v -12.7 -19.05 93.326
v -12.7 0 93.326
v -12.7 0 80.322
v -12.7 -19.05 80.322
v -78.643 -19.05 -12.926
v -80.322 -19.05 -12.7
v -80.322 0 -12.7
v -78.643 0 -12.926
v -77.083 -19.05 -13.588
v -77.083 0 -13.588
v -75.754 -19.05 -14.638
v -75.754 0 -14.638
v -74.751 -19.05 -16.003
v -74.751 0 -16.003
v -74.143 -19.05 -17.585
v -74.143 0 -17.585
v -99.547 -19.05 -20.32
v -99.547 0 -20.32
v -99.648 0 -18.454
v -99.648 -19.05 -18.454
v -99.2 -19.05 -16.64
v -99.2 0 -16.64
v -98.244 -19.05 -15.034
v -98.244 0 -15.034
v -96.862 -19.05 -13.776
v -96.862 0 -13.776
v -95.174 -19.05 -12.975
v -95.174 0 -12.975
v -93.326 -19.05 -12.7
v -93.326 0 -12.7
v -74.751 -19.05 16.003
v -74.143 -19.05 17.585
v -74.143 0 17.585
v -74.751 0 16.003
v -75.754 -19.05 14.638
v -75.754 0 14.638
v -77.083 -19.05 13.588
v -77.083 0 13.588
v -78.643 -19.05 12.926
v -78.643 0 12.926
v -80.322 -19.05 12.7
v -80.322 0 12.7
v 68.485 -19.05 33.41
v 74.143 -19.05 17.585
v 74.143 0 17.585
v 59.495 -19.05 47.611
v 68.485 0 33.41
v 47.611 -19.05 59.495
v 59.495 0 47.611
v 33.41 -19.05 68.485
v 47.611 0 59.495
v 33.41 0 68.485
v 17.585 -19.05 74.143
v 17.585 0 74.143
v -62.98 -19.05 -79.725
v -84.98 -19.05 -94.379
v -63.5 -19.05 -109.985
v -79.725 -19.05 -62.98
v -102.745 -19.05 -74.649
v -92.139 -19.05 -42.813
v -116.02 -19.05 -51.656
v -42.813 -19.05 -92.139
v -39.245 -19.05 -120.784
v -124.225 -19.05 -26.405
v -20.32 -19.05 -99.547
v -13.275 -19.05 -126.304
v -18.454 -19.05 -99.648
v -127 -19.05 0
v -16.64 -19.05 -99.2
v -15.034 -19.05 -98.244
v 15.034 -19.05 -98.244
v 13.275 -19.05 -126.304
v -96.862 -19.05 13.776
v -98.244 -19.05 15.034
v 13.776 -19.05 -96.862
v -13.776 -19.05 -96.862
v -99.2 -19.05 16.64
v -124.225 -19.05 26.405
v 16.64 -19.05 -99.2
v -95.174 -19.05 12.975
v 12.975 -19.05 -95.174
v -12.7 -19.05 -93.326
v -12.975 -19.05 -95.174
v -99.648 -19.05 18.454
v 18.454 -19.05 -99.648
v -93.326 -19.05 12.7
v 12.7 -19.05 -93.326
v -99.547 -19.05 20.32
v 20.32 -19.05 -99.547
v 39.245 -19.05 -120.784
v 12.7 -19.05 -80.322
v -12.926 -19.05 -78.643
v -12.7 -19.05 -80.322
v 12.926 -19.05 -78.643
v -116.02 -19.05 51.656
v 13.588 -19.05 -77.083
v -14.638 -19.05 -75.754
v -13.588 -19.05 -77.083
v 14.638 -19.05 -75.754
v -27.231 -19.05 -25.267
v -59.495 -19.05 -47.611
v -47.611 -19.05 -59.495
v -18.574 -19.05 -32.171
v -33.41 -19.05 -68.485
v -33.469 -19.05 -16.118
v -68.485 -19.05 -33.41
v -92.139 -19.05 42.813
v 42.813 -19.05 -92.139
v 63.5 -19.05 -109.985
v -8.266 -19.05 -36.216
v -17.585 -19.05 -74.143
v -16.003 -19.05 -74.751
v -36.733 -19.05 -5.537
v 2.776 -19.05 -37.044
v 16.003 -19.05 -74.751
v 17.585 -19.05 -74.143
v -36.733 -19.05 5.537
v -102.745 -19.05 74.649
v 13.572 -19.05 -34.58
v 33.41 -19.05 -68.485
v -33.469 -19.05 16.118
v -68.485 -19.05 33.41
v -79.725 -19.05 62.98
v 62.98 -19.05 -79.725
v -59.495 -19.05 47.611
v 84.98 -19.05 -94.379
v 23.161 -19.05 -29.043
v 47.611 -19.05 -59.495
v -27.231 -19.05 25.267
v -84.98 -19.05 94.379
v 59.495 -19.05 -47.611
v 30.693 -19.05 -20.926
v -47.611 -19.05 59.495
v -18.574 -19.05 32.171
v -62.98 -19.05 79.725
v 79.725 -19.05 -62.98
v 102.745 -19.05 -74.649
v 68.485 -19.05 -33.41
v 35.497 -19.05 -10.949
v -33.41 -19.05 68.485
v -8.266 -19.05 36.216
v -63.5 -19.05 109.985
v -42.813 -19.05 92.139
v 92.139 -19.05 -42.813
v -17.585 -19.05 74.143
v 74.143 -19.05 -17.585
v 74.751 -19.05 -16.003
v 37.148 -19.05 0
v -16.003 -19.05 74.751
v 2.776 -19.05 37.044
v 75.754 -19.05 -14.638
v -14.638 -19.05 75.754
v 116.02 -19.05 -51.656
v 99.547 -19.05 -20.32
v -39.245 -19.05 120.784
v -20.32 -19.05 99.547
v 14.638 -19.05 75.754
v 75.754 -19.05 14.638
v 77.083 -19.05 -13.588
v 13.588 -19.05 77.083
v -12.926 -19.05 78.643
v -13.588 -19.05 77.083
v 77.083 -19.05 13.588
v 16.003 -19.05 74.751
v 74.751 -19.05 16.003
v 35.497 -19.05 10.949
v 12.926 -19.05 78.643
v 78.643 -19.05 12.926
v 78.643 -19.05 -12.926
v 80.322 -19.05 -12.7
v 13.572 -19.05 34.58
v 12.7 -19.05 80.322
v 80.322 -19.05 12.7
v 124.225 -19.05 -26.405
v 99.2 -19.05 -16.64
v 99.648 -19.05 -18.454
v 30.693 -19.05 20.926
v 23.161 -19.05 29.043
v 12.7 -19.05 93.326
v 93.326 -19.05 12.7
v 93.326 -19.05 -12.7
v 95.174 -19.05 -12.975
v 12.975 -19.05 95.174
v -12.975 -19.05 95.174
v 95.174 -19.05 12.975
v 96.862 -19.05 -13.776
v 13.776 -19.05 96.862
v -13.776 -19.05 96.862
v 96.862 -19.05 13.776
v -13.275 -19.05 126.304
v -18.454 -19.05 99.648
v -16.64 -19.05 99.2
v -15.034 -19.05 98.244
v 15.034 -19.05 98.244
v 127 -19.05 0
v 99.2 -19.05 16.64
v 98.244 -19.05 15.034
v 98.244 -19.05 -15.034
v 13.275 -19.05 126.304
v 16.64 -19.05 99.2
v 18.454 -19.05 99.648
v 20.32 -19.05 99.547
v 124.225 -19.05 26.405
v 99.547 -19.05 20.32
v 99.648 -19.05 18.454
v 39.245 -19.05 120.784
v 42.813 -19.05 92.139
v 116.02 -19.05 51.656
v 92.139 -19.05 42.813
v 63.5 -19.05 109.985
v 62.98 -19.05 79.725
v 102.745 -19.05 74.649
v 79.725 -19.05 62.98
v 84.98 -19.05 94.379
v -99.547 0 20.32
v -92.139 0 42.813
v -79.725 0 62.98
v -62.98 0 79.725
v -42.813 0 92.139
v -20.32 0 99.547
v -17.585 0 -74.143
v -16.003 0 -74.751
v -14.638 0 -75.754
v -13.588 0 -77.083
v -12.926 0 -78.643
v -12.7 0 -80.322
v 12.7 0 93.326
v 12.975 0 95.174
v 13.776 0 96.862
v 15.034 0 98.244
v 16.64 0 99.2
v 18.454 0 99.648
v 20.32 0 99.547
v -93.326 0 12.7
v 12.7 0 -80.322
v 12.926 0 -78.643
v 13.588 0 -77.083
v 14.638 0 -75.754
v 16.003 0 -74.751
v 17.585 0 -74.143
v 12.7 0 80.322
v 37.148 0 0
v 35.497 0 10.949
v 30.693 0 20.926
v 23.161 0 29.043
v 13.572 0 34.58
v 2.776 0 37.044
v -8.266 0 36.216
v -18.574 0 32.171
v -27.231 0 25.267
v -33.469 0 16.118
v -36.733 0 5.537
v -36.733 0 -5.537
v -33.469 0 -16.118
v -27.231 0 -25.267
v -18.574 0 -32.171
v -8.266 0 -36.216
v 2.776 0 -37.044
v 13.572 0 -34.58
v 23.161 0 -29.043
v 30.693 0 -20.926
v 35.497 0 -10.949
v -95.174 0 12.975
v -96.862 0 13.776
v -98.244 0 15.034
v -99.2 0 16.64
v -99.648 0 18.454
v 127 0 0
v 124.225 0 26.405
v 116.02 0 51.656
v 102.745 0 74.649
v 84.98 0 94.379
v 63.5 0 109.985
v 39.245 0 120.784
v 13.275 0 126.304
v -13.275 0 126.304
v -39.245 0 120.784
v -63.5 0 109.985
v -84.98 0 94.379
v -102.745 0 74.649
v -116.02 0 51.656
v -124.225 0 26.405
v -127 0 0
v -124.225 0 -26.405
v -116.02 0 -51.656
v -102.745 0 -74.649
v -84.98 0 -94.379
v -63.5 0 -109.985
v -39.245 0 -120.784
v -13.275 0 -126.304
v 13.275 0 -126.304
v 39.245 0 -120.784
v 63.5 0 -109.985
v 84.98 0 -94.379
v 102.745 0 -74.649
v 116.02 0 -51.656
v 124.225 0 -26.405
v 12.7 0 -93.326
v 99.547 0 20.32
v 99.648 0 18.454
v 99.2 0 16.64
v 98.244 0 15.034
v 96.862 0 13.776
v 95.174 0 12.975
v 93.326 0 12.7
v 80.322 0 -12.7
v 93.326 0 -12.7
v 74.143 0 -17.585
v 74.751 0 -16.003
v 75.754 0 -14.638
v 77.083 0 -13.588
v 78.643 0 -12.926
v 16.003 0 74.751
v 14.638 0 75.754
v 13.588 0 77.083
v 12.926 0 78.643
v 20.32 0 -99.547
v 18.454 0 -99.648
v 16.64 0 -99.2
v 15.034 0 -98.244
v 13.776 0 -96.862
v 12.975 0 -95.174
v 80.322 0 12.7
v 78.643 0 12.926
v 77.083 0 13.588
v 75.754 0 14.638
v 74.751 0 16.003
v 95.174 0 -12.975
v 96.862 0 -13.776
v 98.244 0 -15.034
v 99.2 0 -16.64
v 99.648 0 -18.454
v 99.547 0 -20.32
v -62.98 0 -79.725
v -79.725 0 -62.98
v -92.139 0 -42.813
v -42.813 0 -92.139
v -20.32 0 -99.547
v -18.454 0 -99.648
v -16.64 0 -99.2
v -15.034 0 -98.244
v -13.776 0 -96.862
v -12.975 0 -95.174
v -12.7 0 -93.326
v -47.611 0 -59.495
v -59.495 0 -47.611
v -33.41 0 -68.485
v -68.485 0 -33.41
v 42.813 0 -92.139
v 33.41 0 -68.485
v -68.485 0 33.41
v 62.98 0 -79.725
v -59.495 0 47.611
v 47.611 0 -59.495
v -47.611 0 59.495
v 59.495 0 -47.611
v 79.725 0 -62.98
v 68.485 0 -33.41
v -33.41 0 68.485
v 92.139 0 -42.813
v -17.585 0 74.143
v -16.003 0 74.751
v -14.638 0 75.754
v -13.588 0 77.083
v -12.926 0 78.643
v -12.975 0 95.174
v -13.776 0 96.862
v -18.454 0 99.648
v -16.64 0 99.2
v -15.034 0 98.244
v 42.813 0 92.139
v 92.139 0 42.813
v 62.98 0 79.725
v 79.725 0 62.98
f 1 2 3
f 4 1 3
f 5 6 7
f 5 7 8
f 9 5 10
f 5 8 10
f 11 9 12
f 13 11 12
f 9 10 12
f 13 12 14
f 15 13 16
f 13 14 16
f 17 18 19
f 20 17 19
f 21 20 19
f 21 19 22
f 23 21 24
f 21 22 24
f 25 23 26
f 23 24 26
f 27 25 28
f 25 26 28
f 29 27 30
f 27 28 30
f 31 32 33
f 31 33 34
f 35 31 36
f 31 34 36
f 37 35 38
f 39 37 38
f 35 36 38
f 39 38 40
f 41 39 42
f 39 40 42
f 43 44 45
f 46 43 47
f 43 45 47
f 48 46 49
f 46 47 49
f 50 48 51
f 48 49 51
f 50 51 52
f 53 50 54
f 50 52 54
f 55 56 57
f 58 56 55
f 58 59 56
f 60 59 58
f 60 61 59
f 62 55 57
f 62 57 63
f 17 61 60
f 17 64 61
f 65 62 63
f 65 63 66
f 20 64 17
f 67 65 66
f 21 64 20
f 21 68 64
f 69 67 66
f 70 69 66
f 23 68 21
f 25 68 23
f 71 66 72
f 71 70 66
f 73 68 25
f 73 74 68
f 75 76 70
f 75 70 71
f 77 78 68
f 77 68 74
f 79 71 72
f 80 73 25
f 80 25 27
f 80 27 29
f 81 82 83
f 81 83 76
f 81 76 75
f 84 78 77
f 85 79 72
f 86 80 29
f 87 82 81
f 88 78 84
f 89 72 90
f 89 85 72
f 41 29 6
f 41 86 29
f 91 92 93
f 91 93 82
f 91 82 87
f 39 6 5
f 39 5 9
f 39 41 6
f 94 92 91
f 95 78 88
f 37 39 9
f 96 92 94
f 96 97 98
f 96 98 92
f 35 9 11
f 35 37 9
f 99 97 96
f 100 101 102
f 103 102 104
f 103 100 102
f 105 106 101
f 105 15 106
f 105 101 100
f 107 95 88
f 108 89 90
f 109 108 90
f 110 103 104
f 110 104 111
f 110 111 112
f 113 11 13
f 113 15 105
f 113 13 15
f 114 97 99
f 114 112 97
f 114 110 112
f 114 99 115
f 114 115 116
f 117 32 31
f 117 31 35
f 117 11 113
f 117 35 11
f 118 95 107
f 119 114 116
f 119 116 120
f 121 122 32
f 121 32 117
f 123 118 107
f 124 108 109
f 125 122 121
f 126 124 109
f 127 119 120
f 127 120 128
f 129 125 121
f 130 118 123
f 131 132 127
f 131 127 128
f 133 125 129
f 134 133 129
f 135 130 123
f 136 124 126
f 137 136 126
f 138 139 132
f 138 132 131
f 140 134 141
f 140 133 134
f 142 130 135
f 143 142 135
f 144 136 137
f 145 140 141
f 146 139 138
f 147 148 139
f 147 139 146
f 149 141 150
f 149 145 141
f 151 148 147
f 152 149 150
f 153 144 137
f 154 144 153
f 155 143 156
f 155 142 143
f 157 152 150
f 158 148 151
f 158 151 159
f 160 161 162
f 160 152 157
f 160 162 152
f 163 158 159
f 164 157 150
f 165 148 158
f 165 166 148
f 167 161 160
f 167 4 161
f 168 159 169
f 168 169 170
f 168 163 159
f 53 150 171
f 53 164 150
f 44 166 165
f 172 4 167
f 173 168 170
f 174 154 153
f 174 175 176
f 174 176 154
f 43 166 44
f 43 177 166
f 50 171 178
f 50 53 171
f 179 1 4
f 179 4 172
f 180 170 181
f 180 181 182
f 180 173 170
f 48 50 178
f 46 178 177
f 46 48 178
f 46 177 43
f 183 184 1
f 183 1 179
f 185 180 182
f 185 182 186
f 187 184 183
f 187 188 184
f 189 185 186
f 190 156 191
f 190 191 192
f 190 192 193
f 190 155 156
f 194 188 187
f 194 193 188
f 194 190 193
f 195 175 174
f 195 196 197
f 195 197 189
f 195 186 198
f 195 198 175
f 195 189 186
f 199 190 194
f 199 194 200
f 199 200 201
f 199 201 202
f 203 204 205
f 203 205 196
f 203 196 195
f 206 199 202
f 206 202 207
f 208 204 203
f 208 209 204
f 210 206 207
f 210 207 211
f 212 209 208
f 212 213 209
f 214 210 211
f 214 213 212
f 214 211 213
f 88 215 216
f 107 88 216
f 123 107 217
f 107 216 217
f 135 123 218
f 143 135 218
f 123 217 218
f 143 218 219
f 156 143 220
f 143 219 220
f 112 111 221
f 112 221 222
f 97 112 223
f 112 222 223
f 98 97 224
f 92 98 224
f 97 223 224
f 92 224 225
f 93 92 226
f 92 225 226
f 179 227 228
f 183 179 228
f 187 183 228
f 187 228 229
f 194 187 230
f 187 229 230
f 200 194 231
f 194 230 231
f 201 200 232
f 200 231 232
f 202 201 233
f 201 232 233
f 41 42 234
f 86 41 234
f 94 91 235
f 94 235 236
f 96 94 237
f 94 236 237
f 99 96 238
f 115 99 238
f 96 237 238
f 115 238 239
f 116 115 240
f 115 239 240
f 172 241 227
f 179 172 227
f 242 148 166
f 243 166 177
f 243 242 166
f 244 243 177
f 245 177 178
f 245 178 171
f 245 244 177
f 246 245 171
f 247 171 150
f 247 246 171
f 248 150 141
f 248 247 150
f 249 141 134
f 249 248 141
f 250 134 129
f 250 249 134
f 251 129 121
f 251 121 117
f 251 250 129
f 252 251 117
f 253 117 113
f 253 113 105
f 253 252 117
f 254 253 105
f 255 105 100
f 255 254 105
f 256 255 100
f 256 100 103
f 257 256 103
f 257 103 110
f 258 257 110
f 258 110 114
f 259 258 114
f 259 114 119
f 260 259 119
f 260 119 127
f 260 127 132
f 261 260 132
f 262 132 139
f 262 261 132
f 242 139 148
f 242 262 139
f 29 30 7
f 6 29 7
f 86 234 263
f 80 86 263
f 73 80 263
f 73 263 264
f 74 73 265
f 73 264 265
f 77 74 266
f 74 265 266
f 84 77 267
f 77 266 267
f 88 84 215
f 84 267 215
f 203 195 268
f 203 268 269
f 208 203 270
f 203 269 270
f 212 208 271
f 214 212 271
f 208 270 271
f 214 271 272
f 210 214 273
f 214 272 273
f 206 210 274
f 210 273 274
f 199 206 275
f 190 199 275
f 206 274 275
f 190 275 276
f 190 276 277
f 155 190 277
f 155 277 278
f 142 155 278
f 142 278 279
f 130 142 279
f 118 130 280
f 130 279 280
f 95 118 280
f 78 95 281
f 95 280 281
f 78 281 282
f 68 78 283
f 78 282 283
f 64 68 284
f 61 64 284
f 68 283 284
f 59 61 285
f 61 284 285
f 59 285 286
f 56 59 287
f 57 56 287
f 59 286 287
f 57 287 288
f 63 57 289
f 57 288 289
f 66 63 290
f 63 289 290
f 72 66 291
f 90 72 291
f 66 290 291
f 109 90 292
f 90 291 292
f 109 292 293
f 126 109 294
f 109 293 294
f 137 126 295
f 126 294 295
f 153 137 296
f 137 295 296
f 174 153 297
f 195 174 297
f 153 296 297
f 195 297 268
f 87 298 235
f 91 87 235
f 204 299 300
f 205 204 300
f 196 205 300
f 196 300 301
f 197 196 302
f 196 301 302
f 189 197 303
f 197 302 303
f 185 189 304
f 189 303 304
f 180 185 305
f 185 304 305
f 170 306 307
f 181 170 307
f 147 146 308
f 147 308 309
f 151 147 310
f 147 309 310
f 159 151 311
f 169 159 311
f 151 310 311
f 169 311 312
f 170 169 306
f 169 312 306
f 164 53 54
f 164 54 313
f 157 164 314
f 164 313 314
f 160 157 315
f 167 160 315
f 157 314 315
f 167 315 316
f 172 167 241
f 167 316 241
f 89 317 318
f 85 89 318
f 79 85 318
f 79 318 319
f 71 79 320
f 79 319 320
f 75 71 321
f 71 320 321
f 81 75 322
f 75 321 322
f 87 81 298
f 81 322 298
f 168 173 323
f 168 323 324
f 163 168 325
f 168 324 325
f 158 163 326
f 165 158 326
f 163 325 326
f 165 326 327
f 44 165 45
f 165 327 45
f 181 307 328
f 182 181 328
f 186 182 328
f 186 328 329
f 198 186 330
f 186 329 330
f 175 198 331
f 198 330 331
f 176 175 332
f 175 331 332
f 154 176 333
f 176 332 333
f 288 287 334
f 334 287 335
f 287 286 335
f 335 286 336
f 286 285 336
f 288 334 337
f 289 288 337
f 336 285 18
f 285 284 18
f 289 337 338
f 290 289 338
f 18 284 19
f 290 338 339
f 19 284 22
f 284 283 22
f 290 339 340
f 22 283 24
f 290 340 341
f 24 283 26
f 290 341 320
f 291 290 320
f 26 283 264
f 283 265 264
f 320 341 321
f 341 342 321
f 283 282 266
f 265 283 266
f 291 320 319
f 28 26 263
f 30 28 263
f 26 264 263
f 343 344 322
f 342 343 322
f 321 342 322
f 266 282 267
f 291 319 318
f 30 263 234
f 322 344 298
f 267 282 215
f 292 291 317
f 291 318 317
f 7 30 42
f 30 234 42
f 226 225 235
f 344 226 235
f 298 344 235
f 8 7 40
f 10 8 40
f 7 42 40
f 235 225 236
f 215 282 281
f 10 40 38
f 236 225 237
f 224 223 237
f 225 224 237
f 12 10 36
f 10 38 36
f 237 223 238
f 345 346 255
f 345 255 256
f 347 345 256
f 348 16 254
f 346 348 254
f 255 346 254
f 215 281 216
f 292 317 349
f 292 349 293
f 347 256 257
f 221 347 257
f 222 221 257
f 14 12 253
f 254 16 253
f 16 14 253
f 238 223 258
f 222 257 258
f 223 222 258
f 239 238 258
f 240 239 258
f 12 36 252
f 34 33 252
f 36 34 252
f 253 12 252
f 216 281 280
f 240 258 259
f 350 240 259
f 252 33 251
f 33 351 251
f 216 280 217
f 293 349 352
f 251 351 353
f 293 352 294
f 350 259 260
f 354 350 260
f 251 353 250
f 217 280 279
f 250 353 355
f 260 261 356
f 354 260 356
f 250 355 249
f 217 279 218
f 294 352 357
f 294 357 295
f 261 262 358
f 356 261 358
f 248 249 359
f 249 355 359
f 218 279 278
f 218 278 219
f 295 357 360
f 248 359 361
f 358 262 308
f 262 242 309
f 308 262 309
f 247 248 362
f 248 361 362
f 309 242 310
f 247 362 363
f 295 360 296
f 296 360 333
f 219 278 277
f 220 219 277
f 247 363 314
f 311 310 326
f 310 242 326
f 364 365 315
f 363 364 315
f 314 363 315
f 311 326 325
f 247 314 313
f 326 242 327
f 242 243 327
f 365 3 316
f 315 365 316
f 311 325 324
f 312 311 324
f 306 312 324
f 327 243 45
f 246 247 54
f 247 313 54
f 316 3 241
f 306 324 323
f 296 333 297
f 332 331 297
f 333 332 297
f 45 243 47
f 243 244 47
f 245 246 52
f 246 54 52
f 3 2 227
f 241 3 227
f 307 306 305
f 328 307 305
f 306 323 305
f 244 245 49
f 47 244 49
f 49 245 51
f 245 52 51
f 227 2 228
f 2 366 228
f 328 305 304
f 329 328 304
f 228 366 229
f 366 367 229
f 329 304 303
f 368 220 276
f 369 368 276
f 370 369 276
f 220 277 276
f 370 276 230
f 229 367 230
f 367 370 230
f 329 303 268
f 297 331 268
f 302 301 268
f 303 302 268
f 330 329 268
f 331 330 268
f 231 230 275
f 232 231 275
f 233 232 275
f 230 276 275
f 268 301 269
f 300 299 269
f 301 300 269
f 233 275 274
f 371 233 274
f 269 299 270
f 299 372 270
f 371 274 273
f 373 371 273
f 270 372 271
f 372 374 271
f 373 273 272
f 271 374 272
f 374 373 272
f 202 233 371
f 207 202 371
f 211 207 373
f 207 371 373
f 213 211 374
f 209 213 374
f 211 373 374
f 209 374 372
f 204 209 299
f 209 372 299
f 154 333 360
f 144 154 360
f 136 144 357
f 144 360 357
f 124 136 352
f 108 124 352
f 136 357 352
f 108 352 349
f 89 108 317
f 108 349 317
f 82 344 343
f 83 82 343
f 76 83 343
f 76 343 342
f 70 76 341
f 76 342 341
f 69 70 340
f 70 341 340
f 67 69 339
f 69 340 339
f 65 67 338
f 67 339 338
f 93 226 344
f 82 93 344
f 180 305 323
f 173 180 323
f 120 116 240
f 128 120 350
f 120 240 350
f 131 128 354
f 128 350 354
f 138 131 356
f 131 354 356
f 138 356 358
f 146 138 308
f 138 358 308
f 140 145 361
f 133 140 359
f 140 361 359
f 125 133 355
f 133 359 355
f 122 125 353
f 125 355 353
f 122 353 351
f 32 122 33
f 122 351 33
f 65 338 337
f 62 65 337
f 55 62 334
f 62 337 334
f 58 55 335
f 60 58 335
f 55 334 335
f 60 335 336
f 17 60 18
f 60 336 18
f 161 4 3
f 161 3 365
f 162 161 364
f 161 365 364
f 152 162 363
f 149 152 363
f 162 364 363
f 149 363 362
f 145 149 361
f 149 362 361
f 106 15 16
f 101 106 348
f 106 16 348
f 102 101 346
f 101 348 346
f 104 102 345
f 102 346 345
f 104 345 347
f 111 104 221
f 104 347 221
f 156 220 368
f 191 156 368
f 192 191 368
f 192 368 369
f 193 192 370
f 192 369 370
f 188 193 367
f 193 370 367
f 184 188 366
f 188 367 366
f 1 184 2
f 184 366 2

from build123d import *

# Parameters (mm, degrees)
F0_R     = 127
F0_R_2   = 37.1475
F1_DEPTH = 19.05
F3_DEPTH = 25.4


with BuildPart() as f1:
    # F0 (on Front) → F1 (new body)
    with BuildSketch(Plane.XZ):
        Circle(F0_R)
        Circle(F0_R_2, mode=Mode.SUBTRACT)
    extrude(amount=F1_DEPTH)

    # F2 (on face) → F3 (cut)
    with BuildSketch(Plane(origin=(0, 0, 0), x_dir=(-1, 0, 0), z_dir=(0, 1, 0))):
        with BuildLine():
            ThreePointArc((-17.584615, 74.143249), (-14.06865, 76.38375), (-12.7, 80.321853))
            Line((-12.7, 80.321853), (-12.7, 93.325559))
            ThreePointArc((-12.7, 93.325559), (-15.033907, 98.244248), (-20.32, 99.547263))
            ThreePointArc((-20.32, 99.547263), (-71.842049, 71.842049), (-99.547263, 20.32))
            ThreePointArc((-99.547263, 20.32), (-98.244248, 15.033907), (-93.325559, 12.7))
            Line((-93.325559, 12.7), (-80.321853, 12.7))
            ThreePointArc((-80.321853, 12.7), (-76.38375, 14.06865), (-74.143249, 17.584615))
            ThreePointArc((-74.143249, 17.584615), (-53.881537, 53.881537), (-17.584615, 74.143249))
        make_face()
        with BuildLine():
            ThreePointArc((17.584615, 74.143249), (53.881537, 53.881537), (74.143249, 17.584615))
            ThreePointArc((74.143249, 17.584615), (76.38375, 14.06865), (80.321853, 12.7))
            Line((80.321853, 12.7), (93.325559, 12.7))
            ThreePointArc((93.325559, 12.7), (98.244248, 15.033907), (99.547263, 20.32))
            ThreePointArc((99.547263, 20.32), (71.842049, 71.842049), (20.32, 99.547263))
            ThreePointArc((20.32, 99.547263), (15.033907, 98.244248), (12.7, 93.325559))
            Line((12.7, 93.325559), (12.7, 80.321853))
            ThreePointArc((12.7, 80.321853), (14.06865, 76.38375), (17.584615, 74.143249))
        make_face()
        with BuildLine():
            Line((93.325559, -12.7), (80.321853, -12.7))
            ThreePointArc((80.321853, -12.7), (76.38375, -14.06865), (74.143249, -17.584615))
            ThreePointArc((74.143249, -17.584615), (53.881537, -53.881537), (17.584615, -74.143249))
            ThreePointArc((17.584615, -74.143249), (14.06865, -76.38375), (12.7, -80.321853))
            Line((12.7, -80.321853), (12.7, -93.325559))
            ThreePointArc((12.7, -93.325559), (15.033907, -98.244248), (20.32, -99.547263))
            ThreePointArc((20.32, -99.547263), (71.842049, -71.842049), (99.547263, -20.32))
            ThreePointArc((99.547263, -20.32), (98.244248, -15.033907), (93.325559, -12.7))
        make_face()
        with BuildLine():
            ThreePointArc((-74.143249, -17.584615), (-76.38375, -14.06865), (-80.321853, -12.7))
            Line((-80.321853, -12.7), (-93.325559, -12.7))
            ThreePointArc((-93.325559, -12.7), (-98.244248, -15.033907), (-99.547263, -20.32))
            ThreePointArc((-99.547263, -20.32), (-71.842049, -71.842049), (-20.32, -99.547263))
            ThreePointArc((-20.32, -99.547263), (-15.033907, -98.244248), (-12.7, -93.325559))
            Line((-12.7, -93.325559), (-12.7, -80.321853))
            ThreePointArc((-12.7, -80.321853), (-14.06865, -76.38375), (-17.584615, -74.143249))
            ThreePointArc((-17.584615, -74.143249), (-53.881537, -53.881537), (-74.143249, -17.584615))
        make_face()
    extrude(amount=-F3_DEPTH, mode=Mode.SUBTRACT)


solid = f1.part
